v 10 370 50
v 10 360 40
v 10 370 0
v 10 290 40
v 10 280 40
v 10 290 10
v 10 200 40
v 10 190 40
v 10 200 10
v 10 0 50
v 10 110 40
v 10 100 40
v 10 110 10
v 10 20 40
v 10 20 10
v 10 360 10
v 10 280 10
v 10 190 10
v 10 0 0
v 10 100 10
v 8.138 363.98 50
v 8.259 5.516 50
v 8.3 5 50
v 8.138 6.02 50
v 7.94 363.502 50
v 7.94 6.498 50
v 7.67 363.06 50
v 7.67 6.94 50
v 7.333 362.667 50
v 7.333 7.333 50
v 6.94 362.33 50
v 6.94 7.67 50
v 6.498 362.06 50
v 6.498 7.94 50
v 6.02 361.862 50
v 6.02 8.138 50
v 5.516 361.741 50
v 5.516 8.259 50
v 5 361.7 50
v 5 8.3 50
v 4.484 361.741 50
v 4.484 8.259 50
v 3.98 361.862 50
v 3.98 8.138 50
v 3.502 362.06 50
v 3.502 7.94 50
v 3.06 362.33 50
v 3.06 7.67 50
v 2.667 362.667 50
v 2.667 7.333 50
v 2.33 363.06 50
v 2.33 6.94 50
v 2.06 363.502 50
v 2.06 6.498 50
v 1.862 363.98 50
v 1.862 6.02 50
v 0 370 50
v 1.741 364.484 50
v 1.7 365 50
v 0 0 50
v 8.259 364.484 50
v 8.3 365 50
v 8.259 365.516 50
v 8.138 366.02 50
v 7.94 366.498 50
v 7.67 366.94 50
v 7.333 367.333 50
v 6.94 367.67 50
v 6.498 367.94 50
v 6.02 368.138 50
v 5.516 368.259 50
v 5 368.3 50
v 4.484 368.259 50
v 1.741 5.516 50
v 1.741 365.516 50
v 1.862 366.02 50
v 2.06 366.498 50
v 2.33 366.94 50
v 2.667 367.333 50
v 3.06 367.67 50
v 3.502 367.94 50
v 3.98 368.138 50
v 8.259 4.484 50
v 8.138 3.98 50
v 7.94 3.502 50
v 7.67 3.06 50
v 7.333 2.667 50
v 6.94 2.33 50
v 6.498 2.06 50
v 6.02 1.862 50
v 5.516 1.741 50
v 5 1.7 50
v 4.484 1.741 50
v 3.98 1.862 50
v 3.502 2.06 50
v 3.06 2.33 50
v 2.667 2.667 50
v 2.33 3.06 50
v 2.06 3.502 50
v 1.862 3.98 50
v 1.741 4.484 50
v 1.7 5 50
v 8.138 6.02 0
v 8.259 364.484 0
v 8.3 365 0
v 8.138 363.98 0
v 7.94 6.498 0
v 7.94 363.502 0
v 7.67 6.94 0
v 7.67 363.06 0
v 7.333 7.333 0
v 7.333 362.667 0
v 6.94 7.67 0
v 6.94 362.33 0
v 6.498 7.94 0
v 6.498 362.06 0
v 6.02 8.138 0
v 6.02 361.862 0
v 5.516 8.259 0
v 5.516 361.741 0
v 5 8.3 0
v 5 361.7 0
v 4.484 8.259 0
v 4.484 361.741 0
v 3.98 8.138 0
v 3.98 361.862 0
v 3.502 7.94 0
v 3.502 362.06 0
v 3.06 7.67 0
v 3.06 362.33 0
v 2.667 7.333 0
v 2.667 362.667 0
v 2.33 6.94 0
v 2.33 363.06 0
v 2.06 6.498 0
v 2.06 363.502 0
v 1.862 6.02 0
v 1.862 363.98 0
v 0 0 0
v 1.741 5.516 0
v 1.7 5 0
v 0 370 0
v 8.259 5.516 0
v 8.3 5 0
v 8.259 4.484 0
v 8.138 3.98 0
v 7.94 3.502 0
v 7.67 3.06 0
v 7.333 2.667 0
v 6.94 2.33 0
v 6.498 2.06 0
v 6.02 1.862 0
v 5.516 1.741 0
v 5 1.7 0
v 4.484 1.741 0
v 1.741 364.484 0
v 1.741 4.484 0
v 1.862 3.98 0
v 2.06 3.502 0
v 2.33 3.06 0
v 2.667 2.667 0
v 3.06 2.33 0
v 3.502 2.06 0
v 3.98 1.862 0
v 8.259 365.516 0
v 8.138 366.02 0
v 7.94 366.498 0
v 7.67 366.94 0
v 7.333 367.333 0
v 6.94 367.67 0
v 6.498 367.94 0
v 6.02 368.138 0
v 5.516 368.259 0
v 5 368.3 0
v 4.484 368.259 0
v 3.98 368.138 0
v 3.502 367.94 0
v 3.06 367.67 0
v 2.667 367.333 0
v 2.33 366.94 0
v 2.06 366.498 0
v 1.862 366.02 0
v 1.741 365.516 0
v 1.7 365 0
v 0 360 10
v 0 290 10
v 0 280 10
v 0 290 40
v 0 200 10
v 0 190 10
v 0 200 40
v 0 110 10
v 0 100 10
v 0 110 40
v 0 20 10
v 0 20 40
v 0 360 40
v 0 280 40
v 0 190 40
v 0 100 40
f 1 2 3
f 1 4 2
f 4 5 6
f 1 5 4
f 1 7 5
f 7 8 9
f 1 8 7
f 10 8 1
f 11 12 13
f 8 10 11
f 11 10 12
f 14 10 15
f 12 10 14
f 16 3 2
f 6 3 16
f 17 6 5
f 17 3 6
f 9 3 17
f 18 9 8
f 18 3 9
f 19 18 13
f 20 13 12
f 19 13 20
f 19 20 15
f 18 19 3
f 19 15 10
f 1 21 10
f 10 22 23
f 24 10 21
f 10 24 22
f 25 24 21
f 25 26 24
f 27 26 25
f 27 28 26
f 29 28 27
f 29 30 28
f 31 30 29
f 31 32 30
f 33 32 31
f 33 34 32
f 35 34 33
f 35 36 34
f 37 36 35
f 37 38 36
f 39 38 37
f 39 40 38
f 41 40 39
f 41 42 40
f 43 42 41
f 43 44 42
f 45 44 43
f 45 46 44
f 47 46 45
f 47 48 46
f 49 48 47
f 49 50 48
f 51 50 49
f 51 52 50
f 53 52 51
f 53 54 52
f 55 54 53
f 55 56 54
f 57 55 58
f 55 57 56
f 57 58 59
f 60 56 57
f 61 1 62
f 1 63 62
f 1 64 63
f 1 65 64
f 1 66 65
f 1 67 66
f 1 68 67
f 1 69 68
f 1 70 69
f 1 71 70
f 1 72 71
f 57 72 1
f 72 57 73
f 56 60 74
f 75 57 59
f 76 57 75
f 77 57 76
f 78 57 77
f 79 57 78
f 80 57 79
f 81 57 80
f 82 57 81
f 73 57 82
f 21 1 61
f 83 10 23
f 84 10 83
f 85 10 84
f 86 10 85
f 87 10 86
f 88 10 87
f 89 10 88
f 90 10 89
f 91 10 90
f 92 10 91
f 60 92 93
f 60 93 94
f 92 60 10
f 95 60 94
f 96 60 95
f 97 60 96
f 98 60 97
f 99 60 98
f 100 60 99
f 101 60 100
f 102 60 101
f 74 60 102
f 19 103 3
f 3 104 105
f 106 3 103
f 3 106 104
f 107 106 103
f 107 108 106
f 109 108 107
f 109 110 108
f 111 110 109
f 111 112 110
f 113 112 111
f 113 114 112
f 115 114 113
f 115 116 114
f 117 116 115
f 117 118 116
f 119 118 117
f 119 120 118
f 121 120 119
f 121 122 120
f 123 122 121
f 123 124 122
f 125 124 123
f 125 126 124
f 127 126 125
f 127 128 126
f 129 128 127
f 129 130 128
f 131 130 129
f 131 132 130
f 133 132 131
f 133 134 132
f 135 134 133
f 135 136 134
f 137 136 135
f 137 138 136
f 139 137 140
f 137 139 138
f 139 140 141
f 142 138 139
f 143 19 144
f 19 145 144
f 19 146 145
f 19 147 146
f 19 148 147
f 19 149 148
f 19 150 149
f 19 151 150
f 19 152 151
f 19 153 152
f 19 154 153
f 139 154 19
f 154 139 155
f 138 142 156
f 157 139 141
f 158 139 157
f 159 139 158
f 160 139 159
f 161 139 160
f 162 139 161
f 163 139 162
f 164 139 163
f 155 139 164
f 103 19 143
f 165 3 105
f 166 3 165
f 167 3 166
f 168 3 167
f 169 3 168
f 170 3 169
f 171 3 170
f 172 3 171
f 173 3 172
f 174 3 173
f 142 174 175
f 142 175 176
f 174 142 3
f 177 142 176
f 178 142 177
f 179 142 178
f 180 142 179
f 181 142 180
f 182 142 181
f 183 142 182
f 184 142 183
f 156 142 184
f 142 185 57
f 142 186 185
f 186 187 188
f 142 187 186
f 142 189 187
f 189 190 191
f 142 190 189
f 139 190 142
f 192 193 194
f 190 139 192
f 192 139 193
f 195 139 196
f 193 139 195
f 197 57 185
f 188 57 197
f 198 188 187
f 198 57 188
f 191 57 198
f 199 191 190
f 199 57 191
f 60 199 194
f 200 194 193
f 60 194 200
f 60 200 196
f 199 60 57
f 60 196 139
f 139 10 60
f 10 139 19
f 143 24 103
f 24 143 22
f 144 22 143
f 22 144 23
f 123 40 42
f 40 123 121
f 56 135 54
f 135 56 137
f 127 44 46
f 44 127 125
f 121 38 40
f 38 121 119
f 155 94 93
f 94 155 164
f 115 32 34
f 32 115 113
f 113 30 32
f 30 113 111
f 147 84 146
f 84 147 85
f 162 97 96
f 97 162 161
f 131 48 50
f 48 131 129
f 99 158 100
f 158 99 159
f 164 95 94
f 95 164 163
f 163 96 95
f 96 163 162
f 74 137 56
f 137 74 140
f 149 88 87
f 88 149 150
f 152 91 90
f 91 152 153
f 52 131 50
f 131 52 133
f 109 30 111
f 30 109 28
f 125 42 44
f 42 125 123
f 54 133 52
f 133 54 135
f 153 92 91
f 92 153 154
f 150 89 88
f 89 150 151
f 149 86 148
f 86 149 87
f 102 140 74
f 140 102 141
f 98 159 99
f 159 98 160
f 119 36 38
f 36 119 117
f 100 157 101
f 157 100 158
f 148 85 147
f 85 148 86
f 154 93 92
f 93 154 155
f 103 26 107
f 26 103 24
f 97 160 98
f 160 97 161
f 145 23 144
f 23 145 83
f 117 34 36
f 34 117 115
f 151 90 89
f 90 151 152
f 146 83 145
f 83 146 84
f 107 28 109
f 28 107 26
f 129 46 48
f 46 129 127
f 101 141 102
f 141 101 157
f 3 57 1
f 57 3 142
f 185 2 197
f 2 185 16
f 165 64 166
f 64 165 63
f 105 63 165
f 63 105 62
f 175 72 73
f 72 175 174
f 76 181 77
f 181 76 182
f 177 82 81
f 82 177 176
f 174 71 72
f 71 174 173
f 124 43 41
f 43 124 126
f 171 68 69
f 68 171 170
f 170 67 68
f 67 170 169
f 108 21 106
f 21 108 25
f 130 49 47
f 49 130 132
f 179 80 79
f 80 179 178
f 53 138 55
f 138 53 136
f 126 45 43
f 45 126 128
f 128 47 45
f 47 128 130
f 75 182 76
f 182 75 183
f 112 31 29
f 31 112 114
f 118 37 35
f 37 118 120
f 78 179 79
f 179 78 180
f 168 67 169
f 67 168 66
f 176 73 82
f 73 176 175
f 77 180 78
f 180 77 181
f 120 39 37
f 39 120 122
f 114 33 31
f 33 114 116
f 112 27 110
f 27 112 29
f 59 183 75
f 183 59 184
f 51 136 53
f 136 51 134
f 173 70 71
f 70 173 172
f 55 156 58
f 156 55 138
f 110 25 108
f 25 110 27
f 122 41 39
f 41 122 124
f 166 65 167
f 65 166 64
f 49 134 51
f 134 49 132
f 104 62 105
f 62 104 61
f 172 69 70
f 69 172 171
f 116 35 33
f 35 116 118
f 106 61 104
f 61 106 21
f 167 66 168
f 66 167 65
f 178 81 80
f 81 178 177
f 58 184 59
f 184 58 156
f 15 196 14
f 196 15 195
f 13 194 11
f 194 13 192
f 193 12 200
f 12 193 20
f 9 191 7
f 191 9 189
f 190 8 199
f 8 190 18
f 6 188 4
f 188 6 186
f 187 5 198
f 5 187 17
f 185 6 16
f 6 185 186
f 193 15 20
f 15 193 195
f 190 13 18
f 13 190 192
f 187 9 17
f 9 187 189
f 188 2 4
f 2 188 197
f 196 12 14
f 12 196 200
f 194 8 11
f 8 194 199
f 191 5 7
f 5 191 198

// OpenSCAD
// cage_side_xneg.scad
// Generates one 50mm-tall side band for the -X wall.
bar = 10;
inner = 350;
segH = 50;
holeD = 6.6;
gap = 80;
outer = inner + 2 * bar;

module corner_block()
{
  difference()
  {
    cube([bar, bar, segH], center = false);
    translate([bar / 2, bar / 2, 0]) cylinder(d = holeD, h = segH, $fn = 40);
  }
}

module side_band_x()
{
  union()
  {
    translate([0, 0, 0]) corner_block();
    translate([0, outer -bar, 0]) corner_block();
    translate([0, bar, 0]) cube([bar, outer -2 * bar, bar], center = false);
    translate([0, bar, segH -bar]) cube([bar, outer -2 * bar, bar], center = false);
    y0 = bar;
    maxY = outer -bar;
    L = inner;
    n = floor((L + gap) / (bar + gap));
    for(k = [0:n])
    {
      y = y0 + k * (bar + gap);
      if(y + bar <= maxY + 1e-6)
      {
        translate([0, y, 0]) cube([bar, bar, segH], center = false);
      }
    }
  }
}

side_band_x();
